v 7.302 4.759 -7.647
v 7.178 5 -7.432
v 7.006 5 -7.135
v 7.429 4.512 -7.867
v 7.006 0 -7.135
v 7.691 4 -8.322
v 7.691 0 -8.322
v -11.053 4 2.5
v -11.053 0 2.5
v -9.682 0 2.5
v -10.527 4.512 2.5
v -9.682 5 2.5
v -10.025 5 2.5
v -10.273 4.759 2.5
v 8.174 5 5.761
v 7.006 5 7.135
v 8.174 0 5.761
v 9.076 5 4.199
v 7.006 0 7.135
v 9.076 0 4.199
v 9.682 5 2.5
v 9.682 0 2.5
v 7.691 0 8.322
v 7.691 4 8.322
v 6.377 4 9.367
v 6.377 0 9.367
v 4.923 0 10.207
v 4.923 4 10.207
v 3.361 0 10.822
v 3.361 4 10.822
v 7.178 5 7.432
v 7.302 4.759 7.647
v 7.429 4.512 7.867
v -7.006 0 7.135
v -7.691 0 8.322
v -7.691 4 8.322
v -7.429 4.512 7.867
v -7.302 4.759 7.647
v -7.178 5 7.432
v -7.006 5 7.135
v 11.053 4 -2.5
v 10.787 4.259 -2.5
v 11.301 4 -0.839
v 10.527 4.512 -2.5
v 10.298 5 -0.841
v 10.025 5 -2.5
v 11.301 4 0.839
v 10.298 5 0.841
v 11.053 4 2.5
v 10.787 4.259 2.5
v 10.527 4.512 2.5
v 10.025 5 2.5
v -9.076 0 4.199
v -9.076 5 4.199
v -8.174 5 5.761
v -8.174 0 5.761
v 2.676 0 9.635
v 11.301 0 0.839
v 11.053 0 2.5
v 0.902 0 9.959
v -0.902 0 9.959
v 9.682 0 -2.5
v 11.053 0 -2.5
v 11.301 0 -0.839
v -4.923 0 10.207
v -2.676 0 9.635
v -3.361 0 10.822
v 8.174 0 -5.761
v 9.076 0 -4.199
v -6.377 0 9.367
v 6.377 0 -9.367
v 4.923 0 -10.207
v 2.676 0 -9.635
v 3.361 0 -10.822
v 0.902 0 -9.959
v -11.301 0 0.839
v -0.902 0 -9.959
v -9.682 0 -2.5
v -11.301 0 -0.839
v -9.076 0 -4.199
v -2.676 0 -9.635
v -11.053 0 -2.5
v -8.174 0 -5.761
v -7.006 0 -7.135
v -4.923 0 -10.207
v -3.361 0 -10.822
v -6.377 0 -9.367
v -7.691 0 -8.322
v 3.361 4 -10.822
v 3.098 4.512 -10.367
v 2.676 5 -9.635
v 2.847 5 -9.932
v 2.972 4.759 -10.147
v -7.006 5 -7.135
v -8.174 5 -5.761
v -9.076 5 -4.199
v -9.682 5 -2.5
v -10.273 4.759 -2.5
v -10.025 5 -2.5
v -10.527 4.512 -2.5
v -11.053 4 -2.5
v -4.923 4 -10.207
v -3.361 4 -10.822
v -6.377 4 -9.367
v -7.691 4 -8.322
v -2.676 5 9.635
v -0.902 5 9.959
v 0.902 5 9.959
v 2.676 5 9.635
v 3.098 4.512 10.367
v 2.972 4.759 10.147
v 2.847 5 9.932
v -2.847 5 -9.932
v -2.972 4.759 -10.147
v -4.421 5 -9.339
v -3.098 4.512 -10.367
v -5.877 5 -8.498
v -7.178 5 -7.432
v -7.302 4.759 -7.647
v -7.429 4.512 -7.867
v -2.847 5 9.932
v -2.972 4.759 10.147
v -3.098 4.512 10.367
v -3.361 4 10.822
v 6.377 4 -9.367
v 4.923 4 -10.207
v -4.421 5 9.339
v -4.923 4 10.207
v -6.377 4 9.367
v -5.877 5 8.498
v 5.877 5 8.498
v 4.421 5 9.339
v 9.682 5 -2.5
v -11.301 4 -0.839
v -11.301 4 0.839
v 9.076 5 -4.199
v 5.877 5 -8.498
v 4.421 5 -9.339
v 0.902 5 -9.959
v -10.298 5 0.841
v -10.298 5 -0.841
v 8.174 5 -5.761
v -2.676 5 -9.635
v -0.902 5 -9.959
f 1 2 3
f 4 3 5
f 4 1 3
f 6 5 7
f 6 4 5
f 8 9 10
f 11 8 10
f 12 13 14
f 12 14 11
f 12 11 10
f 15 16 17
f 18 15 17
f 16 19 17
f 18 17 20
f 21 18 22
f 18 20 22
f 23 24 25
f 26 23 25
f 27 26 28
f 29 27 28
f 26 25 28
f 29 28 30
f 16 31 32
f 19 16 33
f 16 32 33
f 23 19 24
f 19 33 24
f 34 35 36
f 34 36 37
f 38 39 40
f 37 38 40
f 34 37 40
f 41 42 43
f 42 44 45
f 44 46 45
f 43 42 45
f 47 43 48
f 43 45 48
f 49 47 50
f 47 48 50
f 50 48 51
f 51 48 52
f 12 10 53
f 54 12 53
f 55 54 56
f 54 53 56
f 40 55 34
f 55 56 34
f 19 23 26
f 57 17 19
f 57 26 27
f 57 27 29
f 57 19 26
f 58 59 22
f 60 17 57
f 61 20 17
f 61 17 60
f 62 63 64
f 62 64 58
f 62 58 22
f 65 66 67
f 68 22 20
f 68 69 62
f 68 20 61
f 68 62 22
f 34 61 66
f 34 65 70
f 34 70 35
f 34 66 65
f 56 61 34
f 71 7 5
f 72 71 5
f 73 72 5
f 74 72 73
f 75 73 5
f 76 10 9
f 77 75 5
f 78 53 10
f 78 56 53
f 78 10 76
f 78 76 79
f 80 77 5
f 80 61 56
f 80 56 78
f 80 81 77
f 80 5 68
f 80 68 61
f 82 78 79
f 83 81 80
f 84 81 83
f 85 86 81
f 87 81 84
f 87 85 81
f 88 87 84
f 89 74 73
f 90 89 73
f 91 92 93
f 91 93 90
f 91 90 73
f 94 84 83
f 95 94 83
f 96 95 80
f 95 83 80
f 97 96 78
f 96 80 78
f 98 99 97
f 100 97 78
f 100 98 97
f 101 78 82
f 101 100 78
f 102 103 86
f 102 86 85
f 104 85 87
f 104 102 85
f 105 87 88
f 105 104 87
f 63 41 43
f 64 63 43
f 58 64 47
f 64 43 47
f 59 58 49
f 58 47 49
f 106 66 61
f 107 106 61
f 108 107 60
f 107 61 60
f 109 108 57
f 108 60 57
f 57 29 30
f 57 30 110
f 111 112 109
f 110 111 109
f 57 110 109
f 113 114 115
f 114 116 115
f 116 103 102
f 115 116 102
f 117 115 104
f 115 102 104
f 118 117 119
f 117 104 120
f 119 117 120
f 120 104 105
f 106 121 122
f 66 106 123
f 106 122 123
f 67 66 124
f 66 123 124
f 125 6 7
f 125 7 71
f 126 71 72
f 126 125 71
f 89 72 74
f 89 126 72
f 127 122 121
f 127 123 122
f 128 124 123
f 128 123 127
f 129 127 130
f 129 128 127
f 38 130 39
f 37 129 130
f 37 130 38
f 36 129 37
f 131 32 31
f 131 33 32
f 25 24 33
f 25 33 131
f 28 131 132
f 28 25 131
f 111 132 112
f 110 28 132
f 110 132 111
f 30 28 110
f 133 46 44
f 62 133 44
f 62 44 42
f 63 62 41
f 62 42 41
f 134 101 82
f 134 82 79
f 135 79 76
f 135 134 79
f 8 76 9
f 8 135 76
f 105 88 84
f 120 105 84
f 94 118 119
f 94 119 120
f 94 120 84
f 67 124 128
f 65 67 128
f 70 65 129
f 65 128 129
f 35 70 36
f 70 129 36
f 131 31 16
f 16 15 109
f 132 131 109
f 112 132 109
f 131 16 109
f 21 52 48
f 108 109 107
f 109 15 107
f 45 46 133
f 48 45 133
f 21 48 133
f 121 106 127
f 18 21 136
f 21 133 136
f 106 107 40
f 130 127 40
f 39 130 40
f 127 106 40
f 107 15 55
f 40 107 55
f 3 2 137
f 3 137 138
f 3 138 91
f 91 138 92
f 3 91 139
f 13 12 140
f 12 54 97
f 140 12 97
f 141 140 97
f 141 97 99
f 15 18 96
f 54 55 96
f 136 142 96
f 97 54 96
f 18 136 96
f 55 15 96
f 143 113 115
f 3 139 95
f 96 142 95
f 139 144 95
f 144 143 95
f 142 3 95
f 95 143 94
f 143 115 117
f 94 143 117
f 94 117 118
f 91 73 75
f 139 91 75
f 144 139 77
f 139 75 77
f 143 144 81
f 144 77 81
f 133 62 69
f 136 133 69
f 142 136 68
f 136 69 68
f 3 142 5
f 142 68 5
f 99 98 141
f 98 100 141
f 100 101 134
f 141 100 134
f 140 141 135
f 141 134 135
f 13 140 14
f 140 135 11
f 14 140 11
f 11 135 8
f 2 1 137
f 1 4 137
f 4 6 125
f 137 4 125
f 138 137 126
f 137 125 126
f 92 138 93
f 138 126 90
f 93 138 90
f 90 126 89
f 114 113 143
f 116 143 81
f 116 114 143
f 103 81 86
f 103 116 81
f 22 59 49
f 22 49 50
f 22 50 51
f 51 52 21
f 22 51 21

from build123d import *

# Parameters (mm, degrees)
SKETCH_1_R               = 10
EXTRUDE_1_DEPTH          = 5
EXTRUDE_2_DEPTH          = 5
PATTERN_CIRCULAR_1_COUNT = 3
PATTERN_CIRCULAR_1_ANGLE = 120
CHAMFER_1_SIZE           = 1


with BuildPart() as part:
    # 草图1 → 凸台-拉伸1 (new body)
    with BuildSketch(Plane(origin=(0, 0, 0), x_dir=(1, 0, 0), z_dir=(0, 1, 0))):
        Circle(SKETCH_1_R)
    extrude(amount=EXTRUDE_1_DEPTH)

    # 草图2 → 凸台-拉伸2 (add)
    with BuildSketch(Plane(origin=(0, 5, 0), x_dir=(1, 0, 0), z_dir=(0, 1, 0))):
        with BuildLine():
            Line((9.682458366, 2.5), (11.052828845, 2.5))
            ThreePointArc((11.052828845, 2.5), (11.332035363, 0), (11.052828845, -2.5))
            Line((11.052828845, -2.5), (9.682458366, -2.5))
            ThreePointArc((9.682458366, -2.5), (10, 0), (9.682458366, 2.5))
        make_face()
        with BuildLine():
            Line((-11.052828845, -2.5), (-9.682458366, -2.5))
            ThreePointArc((-9.682458366, -2.5), (-10, 0), (-9.682458366, 2.5))
            Line((-9.682458366, 2.5), (-11.052828845, 2.5))
            ThreePointArc((-11.052828845, 2.5), (-11.332035363, 0), (-11.052828845, -2.5))
        make_face()
    extrude_2 = extrude(amount=-EXTRUDE_2_DEPTH)

    # 阵列(圆周)1: 凸台-拉伸2 ×3 about axis
    pattern_circular_1_axis = Axis((0, 0, 0), (0, -1, 0))
    for i in range(1, PATTERN_CIRCULAR_1_COUNT):
        add(extrude_2.rotate(pattern_circular_1_axis, i * PATTERN_CIRCULAR_1_ANGLE / (PATTERN_CIRCULAR_1_COUNT - 1)))

    # 倒角1
    chamfer_1_edges = [part.edges().sort_by_distance(p)[0] for p in [
        (-11.332035363, 5, 0),
        (5.666017682, 5, 9.813830501),
        (-5.666017682, 5, -9.813830501),
        (-5.666017682, 5, 9.813830501),
        (5.666017682, 5, -9.813830501),
        (11.332035363, 5, 0),
    ]]
    chamfer(chamfer_1_edges, length=CHAMFER_1_SIZE)


solid = part.part
